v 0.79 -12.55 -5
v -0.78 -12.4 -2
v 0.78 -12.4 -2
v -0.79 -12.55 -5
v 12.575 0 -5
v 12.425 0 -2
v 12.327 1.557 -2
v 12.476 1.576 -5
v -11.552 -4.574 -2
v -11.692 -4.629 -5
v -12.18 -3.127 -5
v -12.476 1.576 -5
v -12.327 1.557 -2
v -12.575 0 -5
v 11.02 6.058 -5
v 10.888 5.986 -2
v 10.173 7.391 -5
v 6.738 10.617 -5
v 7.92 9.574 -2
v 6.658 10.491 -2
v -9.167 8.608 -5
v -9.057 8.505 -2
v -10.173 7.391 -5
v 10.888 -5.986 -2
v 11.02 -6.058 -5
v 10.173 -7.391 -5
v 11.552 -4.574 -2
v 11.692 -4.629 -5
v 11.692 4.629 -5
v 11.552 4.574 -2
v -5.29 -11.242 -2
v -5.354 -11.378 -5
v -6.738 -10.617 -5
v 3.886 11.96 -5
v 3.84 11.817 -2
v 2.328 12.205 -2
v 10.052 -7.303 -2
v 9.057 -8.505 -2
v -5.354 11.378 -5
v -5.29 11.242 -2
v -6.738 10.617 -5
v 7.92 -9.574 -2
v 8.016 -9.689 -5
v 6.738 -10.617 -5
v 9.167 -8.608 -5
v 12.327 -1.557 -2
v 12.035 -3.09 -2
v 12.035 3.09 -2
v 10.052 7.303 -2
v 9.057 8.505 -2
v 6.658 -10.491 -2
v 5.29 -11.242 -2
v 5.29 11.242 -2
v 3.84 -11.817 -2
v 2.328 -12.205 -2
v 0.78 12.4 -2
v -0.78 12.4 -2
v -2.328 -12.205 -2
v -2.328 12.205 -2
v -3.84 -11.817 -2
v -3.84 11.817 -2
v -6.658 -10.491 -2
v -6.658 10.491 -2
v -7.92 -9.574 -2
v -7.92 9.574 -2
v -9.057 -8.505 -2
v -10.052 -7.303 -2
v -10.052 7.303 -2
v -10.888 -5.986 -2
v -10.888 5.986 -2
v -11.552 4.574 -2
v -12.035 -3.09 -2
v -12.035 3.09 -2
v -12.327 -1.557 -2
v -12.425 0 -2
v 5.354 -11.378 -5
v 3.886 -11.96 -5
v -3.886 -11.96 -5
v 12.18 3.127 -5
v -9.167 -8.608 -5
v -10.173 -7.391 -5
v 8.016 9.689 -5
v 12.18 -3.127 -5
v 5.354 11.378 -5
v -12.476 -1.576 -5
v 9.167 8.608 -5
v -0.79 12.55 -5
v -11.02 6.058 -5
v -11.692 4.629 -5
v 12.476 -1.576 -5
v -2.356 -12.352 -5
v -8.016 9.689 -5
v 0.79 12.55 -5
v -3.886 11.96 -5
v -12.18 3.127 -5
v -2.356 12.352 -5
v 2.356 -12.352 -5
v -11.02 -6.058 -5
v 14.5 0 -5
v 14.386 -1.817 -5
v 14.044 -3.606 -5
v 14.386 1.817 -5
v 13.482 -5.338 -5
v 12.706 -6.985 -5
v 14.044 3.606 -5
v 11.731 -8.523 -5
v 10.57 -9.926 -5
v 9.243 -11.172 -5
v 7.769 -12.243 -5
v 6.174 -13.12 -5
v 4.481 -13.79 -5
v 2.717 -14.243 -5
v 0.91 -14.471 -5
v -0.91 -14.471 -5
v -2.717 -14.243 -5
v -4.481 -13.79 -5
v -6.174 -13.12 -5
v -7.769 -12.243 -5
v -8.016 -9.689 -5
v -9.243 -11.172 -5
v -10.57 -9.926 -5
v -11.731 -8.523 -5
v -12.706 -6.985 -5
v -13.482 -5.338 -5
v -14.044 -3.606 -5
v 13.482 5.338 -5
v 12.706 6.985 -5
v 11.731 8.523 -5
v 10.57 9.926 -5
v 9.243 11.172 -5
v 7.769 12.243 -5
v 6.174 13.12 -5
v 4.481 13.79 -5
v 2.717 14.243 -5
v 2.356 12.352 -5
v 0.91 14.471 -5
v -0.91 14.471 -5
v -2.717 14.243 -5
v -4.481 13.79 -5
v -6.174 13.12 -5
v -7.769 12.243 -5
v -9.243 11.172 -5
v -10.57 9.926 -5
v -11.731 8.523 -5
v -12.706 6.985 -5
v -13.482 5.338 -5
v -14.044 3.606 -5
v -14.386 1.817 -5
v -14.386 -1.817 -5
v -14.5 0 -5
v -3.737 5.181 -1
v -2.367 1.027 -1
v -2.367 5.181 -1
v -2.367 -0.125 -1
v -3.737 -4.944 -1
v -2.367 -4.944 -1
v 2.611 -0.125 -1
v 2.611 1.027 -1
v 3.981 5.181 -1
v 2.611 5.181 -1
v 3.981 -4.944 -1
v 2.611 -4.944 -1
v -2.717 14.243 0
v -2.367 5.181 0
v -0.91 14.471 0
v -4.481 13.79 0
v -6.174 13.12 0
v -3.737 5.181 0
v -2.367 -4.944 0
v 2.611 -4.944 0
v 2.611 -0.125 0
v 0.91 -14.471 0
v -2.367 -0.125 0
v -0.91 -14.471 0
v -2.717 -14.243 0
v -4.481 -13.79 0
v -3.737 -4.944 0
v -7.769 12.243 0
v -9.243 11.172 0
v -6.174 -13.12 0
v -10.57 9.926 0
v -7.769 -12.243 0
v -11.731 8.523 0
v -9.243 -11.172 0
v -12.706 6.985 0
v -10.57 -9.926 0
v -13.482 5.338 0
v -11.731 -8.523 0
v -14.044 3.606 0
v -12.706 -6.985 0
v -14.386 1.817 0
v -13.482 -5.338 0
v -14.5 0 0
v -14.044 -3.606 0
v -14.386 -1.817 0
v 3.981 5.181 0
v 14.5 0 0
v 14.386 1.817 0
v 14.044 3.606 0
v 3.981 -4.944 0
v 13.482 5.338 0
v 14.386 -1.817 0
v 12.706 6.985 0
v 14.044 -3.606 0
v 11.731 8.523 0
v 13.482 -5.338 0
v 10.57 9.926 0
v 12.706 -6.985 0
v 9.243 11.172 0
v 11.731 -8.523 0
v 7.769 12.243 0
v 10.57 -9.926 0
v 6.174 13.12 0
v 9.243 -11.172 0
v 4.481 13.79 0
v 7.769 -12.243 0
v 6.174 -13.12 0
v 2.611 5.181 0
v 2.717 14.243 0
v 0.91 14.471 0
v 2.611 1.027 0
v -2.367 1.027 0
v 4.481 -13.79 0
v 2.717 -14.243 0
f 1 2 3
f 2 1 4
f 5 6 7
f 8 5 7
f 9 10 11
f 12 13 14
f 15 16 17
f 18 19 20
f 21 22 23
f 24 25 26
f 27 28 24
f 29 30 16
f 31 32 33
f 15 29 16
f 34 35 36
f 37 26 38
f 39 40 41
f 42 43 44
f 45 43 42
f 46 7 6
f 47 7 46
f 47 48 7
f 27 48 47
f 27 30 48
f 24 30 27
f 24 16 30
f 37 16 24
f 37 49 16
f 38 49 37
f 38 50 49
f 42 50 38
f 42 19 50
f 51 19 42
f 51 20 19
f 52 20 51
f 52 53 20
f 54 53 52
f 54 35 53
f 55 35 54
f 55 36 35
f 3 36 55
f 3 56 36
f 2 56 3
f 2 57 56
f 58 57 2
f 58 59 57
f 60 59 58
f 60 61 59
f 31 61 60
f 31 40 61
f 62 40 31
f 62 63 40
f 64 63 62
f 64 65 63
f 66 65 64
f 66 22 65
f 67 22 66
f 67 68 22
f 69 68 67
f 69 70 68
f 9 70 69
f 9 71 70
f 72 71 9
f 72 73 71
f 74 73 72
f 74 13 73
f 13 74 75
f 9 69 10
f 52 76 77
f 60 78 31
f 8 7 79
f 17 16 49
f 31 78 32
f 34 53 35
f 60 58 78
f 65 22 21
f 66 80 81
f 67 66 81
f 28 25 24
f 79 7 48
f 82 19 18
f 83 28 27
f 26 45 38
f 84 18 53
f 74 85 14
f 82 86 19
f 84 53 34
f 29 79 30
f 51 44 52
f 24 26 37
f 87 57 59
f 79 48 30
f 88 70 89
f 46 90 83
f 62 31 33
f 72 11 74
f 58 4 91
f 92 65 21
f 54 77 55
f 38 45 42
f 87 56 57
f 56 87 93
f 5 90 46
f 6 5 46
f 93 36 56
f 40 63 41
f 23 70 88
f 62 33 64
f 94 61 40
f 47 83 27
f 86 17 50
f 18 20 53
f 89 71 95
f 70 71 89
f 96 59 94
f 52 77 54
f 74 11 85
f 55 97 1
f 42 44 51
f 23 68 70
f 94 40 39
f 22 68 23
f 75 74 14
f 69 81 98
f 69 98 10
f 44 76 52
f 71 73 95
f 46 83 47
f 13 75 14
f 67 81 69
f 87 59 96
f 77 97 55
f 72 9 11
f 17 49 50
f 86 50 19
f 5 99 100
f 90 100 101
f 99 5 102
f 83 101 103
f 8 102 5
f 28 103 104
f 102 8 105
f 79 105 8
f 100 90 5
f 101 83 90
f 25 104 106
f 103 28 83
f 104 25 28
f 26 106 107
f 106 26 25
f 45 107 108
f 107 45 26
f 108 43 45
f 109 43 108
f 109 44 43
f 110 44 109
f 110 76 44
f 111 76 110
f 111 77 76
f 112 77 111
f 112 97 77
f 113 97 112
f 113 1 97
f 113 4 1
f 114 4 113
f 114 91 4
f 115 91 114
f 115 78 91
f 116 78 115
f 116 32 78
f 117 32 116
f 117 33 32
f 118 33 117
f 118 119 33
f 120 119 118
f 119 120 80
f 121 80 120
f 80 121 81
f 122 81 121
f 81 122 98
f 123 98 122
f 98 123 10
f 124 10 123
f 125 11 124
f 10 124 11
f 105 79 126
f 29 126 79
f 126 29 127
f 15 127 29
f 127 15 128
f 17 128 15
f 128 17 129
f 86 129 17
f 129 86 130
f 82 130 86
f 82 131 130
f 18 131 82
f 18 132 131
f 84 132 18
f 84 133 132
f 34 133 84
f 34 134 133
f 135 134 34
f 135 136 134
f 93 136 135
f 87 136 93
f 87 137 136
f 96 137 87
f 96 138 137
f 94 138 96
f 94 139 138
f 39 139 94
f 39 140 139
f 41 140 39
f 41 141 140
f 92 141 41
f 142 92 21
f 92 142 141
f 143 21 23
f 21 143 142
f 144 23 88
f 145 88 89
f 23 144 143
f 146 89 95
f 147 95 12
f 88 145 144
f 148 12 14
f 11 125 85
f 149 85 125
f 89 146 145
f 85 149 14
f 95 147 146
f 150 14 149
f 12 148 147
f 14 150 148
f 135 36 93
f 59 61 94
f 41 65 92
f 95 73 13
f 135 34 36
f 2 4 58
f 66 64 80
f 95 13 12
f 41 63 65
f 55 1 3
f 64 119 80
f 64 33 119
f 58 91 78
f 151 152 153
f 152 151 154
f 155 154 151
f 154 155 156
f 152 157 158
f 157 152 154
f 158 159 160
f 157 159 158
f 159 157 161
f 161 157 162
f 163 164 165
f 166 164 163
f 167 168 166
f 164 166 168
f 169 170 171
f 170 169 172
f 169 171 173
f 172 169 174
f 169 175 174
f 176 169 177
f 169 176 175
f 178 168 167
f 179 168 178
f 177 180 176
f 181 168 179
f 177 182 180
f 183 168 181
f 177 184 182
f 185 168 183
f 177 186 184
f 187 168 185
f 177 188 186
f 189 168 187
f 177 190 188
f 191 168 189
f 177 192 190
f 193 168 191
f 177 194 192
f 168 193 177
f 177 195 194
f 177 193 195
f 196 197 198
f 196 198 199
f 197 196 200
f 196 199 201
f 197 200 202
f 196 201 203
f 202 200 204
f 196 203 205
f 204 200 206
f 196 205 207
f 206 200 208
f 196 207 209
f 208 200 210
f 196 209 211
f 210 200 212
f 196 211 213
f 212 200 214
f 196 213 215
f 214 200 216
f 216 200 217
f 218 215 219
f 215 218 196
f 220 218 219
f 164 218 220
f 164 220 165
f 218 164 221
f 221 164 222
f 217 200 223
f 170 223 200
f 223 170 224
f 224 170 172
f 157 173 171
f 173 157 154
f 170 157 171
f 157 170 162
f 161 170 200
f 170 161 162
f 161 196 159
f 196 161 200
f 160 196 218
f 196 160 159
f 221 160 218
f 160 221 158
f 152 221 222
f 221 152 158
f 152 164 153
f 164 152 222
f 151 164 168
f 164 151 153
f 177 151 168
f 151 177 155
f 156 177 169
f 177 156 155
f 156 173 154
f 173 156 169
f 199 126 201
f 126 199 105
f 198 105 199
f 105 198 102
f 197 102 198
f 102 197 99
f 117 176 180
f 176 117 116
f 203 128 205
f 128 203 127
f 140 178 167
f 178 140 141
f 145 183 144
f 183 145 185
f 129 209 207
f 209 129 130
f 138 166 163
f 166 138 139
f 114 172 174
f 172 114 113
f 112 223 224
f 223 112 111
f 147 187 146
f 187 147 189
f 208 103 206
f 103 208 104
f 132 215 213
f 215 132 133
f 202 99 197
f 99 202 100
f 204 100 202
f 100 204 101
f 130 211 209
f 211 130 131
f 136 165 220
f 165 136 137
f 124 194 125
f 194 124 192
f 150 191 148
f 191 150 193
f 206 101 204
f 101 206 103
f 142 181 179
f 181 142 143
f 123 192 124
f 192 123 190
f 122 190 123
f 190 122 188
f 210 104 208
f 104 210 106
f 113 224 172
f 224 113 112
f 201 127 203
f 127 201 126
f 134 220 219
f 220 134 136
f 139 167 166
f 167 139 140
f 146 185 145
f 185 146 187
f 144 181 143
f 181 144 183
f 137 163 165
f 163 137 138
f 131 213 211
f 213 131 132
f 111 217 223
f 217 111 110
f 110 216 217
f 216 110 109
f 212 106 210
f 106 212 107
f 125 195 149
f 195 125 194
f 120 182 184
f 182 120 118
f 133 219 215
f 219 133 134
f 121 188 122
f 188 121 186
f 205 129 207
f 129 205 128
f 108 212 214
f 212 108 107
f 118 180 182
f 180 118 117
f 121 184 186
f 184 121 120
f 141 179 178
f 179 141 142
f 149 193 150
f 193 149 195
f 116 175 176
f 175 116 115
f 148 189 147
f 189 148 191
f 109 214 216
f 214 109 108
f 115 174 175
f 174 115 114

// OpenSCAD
$fn = 50;

difference() {
	union() {
		translate(v = [0, 0, -5.0]) {
			cylinder(h = 5, r = 14.5);
		}
	}
	union() {
		#translate(v = [0, 0, -5.0]) {
			cylinder(h = 3, r1 = 12.575, r2 = 12.425);
		}
		translate(v = [0, 0, -1]) {
			linear_extrude(height = 1) {
				text(font = "Impact", halign = "center", size = 10, text = "H", valign = "center");
			}
		}
	}
}
